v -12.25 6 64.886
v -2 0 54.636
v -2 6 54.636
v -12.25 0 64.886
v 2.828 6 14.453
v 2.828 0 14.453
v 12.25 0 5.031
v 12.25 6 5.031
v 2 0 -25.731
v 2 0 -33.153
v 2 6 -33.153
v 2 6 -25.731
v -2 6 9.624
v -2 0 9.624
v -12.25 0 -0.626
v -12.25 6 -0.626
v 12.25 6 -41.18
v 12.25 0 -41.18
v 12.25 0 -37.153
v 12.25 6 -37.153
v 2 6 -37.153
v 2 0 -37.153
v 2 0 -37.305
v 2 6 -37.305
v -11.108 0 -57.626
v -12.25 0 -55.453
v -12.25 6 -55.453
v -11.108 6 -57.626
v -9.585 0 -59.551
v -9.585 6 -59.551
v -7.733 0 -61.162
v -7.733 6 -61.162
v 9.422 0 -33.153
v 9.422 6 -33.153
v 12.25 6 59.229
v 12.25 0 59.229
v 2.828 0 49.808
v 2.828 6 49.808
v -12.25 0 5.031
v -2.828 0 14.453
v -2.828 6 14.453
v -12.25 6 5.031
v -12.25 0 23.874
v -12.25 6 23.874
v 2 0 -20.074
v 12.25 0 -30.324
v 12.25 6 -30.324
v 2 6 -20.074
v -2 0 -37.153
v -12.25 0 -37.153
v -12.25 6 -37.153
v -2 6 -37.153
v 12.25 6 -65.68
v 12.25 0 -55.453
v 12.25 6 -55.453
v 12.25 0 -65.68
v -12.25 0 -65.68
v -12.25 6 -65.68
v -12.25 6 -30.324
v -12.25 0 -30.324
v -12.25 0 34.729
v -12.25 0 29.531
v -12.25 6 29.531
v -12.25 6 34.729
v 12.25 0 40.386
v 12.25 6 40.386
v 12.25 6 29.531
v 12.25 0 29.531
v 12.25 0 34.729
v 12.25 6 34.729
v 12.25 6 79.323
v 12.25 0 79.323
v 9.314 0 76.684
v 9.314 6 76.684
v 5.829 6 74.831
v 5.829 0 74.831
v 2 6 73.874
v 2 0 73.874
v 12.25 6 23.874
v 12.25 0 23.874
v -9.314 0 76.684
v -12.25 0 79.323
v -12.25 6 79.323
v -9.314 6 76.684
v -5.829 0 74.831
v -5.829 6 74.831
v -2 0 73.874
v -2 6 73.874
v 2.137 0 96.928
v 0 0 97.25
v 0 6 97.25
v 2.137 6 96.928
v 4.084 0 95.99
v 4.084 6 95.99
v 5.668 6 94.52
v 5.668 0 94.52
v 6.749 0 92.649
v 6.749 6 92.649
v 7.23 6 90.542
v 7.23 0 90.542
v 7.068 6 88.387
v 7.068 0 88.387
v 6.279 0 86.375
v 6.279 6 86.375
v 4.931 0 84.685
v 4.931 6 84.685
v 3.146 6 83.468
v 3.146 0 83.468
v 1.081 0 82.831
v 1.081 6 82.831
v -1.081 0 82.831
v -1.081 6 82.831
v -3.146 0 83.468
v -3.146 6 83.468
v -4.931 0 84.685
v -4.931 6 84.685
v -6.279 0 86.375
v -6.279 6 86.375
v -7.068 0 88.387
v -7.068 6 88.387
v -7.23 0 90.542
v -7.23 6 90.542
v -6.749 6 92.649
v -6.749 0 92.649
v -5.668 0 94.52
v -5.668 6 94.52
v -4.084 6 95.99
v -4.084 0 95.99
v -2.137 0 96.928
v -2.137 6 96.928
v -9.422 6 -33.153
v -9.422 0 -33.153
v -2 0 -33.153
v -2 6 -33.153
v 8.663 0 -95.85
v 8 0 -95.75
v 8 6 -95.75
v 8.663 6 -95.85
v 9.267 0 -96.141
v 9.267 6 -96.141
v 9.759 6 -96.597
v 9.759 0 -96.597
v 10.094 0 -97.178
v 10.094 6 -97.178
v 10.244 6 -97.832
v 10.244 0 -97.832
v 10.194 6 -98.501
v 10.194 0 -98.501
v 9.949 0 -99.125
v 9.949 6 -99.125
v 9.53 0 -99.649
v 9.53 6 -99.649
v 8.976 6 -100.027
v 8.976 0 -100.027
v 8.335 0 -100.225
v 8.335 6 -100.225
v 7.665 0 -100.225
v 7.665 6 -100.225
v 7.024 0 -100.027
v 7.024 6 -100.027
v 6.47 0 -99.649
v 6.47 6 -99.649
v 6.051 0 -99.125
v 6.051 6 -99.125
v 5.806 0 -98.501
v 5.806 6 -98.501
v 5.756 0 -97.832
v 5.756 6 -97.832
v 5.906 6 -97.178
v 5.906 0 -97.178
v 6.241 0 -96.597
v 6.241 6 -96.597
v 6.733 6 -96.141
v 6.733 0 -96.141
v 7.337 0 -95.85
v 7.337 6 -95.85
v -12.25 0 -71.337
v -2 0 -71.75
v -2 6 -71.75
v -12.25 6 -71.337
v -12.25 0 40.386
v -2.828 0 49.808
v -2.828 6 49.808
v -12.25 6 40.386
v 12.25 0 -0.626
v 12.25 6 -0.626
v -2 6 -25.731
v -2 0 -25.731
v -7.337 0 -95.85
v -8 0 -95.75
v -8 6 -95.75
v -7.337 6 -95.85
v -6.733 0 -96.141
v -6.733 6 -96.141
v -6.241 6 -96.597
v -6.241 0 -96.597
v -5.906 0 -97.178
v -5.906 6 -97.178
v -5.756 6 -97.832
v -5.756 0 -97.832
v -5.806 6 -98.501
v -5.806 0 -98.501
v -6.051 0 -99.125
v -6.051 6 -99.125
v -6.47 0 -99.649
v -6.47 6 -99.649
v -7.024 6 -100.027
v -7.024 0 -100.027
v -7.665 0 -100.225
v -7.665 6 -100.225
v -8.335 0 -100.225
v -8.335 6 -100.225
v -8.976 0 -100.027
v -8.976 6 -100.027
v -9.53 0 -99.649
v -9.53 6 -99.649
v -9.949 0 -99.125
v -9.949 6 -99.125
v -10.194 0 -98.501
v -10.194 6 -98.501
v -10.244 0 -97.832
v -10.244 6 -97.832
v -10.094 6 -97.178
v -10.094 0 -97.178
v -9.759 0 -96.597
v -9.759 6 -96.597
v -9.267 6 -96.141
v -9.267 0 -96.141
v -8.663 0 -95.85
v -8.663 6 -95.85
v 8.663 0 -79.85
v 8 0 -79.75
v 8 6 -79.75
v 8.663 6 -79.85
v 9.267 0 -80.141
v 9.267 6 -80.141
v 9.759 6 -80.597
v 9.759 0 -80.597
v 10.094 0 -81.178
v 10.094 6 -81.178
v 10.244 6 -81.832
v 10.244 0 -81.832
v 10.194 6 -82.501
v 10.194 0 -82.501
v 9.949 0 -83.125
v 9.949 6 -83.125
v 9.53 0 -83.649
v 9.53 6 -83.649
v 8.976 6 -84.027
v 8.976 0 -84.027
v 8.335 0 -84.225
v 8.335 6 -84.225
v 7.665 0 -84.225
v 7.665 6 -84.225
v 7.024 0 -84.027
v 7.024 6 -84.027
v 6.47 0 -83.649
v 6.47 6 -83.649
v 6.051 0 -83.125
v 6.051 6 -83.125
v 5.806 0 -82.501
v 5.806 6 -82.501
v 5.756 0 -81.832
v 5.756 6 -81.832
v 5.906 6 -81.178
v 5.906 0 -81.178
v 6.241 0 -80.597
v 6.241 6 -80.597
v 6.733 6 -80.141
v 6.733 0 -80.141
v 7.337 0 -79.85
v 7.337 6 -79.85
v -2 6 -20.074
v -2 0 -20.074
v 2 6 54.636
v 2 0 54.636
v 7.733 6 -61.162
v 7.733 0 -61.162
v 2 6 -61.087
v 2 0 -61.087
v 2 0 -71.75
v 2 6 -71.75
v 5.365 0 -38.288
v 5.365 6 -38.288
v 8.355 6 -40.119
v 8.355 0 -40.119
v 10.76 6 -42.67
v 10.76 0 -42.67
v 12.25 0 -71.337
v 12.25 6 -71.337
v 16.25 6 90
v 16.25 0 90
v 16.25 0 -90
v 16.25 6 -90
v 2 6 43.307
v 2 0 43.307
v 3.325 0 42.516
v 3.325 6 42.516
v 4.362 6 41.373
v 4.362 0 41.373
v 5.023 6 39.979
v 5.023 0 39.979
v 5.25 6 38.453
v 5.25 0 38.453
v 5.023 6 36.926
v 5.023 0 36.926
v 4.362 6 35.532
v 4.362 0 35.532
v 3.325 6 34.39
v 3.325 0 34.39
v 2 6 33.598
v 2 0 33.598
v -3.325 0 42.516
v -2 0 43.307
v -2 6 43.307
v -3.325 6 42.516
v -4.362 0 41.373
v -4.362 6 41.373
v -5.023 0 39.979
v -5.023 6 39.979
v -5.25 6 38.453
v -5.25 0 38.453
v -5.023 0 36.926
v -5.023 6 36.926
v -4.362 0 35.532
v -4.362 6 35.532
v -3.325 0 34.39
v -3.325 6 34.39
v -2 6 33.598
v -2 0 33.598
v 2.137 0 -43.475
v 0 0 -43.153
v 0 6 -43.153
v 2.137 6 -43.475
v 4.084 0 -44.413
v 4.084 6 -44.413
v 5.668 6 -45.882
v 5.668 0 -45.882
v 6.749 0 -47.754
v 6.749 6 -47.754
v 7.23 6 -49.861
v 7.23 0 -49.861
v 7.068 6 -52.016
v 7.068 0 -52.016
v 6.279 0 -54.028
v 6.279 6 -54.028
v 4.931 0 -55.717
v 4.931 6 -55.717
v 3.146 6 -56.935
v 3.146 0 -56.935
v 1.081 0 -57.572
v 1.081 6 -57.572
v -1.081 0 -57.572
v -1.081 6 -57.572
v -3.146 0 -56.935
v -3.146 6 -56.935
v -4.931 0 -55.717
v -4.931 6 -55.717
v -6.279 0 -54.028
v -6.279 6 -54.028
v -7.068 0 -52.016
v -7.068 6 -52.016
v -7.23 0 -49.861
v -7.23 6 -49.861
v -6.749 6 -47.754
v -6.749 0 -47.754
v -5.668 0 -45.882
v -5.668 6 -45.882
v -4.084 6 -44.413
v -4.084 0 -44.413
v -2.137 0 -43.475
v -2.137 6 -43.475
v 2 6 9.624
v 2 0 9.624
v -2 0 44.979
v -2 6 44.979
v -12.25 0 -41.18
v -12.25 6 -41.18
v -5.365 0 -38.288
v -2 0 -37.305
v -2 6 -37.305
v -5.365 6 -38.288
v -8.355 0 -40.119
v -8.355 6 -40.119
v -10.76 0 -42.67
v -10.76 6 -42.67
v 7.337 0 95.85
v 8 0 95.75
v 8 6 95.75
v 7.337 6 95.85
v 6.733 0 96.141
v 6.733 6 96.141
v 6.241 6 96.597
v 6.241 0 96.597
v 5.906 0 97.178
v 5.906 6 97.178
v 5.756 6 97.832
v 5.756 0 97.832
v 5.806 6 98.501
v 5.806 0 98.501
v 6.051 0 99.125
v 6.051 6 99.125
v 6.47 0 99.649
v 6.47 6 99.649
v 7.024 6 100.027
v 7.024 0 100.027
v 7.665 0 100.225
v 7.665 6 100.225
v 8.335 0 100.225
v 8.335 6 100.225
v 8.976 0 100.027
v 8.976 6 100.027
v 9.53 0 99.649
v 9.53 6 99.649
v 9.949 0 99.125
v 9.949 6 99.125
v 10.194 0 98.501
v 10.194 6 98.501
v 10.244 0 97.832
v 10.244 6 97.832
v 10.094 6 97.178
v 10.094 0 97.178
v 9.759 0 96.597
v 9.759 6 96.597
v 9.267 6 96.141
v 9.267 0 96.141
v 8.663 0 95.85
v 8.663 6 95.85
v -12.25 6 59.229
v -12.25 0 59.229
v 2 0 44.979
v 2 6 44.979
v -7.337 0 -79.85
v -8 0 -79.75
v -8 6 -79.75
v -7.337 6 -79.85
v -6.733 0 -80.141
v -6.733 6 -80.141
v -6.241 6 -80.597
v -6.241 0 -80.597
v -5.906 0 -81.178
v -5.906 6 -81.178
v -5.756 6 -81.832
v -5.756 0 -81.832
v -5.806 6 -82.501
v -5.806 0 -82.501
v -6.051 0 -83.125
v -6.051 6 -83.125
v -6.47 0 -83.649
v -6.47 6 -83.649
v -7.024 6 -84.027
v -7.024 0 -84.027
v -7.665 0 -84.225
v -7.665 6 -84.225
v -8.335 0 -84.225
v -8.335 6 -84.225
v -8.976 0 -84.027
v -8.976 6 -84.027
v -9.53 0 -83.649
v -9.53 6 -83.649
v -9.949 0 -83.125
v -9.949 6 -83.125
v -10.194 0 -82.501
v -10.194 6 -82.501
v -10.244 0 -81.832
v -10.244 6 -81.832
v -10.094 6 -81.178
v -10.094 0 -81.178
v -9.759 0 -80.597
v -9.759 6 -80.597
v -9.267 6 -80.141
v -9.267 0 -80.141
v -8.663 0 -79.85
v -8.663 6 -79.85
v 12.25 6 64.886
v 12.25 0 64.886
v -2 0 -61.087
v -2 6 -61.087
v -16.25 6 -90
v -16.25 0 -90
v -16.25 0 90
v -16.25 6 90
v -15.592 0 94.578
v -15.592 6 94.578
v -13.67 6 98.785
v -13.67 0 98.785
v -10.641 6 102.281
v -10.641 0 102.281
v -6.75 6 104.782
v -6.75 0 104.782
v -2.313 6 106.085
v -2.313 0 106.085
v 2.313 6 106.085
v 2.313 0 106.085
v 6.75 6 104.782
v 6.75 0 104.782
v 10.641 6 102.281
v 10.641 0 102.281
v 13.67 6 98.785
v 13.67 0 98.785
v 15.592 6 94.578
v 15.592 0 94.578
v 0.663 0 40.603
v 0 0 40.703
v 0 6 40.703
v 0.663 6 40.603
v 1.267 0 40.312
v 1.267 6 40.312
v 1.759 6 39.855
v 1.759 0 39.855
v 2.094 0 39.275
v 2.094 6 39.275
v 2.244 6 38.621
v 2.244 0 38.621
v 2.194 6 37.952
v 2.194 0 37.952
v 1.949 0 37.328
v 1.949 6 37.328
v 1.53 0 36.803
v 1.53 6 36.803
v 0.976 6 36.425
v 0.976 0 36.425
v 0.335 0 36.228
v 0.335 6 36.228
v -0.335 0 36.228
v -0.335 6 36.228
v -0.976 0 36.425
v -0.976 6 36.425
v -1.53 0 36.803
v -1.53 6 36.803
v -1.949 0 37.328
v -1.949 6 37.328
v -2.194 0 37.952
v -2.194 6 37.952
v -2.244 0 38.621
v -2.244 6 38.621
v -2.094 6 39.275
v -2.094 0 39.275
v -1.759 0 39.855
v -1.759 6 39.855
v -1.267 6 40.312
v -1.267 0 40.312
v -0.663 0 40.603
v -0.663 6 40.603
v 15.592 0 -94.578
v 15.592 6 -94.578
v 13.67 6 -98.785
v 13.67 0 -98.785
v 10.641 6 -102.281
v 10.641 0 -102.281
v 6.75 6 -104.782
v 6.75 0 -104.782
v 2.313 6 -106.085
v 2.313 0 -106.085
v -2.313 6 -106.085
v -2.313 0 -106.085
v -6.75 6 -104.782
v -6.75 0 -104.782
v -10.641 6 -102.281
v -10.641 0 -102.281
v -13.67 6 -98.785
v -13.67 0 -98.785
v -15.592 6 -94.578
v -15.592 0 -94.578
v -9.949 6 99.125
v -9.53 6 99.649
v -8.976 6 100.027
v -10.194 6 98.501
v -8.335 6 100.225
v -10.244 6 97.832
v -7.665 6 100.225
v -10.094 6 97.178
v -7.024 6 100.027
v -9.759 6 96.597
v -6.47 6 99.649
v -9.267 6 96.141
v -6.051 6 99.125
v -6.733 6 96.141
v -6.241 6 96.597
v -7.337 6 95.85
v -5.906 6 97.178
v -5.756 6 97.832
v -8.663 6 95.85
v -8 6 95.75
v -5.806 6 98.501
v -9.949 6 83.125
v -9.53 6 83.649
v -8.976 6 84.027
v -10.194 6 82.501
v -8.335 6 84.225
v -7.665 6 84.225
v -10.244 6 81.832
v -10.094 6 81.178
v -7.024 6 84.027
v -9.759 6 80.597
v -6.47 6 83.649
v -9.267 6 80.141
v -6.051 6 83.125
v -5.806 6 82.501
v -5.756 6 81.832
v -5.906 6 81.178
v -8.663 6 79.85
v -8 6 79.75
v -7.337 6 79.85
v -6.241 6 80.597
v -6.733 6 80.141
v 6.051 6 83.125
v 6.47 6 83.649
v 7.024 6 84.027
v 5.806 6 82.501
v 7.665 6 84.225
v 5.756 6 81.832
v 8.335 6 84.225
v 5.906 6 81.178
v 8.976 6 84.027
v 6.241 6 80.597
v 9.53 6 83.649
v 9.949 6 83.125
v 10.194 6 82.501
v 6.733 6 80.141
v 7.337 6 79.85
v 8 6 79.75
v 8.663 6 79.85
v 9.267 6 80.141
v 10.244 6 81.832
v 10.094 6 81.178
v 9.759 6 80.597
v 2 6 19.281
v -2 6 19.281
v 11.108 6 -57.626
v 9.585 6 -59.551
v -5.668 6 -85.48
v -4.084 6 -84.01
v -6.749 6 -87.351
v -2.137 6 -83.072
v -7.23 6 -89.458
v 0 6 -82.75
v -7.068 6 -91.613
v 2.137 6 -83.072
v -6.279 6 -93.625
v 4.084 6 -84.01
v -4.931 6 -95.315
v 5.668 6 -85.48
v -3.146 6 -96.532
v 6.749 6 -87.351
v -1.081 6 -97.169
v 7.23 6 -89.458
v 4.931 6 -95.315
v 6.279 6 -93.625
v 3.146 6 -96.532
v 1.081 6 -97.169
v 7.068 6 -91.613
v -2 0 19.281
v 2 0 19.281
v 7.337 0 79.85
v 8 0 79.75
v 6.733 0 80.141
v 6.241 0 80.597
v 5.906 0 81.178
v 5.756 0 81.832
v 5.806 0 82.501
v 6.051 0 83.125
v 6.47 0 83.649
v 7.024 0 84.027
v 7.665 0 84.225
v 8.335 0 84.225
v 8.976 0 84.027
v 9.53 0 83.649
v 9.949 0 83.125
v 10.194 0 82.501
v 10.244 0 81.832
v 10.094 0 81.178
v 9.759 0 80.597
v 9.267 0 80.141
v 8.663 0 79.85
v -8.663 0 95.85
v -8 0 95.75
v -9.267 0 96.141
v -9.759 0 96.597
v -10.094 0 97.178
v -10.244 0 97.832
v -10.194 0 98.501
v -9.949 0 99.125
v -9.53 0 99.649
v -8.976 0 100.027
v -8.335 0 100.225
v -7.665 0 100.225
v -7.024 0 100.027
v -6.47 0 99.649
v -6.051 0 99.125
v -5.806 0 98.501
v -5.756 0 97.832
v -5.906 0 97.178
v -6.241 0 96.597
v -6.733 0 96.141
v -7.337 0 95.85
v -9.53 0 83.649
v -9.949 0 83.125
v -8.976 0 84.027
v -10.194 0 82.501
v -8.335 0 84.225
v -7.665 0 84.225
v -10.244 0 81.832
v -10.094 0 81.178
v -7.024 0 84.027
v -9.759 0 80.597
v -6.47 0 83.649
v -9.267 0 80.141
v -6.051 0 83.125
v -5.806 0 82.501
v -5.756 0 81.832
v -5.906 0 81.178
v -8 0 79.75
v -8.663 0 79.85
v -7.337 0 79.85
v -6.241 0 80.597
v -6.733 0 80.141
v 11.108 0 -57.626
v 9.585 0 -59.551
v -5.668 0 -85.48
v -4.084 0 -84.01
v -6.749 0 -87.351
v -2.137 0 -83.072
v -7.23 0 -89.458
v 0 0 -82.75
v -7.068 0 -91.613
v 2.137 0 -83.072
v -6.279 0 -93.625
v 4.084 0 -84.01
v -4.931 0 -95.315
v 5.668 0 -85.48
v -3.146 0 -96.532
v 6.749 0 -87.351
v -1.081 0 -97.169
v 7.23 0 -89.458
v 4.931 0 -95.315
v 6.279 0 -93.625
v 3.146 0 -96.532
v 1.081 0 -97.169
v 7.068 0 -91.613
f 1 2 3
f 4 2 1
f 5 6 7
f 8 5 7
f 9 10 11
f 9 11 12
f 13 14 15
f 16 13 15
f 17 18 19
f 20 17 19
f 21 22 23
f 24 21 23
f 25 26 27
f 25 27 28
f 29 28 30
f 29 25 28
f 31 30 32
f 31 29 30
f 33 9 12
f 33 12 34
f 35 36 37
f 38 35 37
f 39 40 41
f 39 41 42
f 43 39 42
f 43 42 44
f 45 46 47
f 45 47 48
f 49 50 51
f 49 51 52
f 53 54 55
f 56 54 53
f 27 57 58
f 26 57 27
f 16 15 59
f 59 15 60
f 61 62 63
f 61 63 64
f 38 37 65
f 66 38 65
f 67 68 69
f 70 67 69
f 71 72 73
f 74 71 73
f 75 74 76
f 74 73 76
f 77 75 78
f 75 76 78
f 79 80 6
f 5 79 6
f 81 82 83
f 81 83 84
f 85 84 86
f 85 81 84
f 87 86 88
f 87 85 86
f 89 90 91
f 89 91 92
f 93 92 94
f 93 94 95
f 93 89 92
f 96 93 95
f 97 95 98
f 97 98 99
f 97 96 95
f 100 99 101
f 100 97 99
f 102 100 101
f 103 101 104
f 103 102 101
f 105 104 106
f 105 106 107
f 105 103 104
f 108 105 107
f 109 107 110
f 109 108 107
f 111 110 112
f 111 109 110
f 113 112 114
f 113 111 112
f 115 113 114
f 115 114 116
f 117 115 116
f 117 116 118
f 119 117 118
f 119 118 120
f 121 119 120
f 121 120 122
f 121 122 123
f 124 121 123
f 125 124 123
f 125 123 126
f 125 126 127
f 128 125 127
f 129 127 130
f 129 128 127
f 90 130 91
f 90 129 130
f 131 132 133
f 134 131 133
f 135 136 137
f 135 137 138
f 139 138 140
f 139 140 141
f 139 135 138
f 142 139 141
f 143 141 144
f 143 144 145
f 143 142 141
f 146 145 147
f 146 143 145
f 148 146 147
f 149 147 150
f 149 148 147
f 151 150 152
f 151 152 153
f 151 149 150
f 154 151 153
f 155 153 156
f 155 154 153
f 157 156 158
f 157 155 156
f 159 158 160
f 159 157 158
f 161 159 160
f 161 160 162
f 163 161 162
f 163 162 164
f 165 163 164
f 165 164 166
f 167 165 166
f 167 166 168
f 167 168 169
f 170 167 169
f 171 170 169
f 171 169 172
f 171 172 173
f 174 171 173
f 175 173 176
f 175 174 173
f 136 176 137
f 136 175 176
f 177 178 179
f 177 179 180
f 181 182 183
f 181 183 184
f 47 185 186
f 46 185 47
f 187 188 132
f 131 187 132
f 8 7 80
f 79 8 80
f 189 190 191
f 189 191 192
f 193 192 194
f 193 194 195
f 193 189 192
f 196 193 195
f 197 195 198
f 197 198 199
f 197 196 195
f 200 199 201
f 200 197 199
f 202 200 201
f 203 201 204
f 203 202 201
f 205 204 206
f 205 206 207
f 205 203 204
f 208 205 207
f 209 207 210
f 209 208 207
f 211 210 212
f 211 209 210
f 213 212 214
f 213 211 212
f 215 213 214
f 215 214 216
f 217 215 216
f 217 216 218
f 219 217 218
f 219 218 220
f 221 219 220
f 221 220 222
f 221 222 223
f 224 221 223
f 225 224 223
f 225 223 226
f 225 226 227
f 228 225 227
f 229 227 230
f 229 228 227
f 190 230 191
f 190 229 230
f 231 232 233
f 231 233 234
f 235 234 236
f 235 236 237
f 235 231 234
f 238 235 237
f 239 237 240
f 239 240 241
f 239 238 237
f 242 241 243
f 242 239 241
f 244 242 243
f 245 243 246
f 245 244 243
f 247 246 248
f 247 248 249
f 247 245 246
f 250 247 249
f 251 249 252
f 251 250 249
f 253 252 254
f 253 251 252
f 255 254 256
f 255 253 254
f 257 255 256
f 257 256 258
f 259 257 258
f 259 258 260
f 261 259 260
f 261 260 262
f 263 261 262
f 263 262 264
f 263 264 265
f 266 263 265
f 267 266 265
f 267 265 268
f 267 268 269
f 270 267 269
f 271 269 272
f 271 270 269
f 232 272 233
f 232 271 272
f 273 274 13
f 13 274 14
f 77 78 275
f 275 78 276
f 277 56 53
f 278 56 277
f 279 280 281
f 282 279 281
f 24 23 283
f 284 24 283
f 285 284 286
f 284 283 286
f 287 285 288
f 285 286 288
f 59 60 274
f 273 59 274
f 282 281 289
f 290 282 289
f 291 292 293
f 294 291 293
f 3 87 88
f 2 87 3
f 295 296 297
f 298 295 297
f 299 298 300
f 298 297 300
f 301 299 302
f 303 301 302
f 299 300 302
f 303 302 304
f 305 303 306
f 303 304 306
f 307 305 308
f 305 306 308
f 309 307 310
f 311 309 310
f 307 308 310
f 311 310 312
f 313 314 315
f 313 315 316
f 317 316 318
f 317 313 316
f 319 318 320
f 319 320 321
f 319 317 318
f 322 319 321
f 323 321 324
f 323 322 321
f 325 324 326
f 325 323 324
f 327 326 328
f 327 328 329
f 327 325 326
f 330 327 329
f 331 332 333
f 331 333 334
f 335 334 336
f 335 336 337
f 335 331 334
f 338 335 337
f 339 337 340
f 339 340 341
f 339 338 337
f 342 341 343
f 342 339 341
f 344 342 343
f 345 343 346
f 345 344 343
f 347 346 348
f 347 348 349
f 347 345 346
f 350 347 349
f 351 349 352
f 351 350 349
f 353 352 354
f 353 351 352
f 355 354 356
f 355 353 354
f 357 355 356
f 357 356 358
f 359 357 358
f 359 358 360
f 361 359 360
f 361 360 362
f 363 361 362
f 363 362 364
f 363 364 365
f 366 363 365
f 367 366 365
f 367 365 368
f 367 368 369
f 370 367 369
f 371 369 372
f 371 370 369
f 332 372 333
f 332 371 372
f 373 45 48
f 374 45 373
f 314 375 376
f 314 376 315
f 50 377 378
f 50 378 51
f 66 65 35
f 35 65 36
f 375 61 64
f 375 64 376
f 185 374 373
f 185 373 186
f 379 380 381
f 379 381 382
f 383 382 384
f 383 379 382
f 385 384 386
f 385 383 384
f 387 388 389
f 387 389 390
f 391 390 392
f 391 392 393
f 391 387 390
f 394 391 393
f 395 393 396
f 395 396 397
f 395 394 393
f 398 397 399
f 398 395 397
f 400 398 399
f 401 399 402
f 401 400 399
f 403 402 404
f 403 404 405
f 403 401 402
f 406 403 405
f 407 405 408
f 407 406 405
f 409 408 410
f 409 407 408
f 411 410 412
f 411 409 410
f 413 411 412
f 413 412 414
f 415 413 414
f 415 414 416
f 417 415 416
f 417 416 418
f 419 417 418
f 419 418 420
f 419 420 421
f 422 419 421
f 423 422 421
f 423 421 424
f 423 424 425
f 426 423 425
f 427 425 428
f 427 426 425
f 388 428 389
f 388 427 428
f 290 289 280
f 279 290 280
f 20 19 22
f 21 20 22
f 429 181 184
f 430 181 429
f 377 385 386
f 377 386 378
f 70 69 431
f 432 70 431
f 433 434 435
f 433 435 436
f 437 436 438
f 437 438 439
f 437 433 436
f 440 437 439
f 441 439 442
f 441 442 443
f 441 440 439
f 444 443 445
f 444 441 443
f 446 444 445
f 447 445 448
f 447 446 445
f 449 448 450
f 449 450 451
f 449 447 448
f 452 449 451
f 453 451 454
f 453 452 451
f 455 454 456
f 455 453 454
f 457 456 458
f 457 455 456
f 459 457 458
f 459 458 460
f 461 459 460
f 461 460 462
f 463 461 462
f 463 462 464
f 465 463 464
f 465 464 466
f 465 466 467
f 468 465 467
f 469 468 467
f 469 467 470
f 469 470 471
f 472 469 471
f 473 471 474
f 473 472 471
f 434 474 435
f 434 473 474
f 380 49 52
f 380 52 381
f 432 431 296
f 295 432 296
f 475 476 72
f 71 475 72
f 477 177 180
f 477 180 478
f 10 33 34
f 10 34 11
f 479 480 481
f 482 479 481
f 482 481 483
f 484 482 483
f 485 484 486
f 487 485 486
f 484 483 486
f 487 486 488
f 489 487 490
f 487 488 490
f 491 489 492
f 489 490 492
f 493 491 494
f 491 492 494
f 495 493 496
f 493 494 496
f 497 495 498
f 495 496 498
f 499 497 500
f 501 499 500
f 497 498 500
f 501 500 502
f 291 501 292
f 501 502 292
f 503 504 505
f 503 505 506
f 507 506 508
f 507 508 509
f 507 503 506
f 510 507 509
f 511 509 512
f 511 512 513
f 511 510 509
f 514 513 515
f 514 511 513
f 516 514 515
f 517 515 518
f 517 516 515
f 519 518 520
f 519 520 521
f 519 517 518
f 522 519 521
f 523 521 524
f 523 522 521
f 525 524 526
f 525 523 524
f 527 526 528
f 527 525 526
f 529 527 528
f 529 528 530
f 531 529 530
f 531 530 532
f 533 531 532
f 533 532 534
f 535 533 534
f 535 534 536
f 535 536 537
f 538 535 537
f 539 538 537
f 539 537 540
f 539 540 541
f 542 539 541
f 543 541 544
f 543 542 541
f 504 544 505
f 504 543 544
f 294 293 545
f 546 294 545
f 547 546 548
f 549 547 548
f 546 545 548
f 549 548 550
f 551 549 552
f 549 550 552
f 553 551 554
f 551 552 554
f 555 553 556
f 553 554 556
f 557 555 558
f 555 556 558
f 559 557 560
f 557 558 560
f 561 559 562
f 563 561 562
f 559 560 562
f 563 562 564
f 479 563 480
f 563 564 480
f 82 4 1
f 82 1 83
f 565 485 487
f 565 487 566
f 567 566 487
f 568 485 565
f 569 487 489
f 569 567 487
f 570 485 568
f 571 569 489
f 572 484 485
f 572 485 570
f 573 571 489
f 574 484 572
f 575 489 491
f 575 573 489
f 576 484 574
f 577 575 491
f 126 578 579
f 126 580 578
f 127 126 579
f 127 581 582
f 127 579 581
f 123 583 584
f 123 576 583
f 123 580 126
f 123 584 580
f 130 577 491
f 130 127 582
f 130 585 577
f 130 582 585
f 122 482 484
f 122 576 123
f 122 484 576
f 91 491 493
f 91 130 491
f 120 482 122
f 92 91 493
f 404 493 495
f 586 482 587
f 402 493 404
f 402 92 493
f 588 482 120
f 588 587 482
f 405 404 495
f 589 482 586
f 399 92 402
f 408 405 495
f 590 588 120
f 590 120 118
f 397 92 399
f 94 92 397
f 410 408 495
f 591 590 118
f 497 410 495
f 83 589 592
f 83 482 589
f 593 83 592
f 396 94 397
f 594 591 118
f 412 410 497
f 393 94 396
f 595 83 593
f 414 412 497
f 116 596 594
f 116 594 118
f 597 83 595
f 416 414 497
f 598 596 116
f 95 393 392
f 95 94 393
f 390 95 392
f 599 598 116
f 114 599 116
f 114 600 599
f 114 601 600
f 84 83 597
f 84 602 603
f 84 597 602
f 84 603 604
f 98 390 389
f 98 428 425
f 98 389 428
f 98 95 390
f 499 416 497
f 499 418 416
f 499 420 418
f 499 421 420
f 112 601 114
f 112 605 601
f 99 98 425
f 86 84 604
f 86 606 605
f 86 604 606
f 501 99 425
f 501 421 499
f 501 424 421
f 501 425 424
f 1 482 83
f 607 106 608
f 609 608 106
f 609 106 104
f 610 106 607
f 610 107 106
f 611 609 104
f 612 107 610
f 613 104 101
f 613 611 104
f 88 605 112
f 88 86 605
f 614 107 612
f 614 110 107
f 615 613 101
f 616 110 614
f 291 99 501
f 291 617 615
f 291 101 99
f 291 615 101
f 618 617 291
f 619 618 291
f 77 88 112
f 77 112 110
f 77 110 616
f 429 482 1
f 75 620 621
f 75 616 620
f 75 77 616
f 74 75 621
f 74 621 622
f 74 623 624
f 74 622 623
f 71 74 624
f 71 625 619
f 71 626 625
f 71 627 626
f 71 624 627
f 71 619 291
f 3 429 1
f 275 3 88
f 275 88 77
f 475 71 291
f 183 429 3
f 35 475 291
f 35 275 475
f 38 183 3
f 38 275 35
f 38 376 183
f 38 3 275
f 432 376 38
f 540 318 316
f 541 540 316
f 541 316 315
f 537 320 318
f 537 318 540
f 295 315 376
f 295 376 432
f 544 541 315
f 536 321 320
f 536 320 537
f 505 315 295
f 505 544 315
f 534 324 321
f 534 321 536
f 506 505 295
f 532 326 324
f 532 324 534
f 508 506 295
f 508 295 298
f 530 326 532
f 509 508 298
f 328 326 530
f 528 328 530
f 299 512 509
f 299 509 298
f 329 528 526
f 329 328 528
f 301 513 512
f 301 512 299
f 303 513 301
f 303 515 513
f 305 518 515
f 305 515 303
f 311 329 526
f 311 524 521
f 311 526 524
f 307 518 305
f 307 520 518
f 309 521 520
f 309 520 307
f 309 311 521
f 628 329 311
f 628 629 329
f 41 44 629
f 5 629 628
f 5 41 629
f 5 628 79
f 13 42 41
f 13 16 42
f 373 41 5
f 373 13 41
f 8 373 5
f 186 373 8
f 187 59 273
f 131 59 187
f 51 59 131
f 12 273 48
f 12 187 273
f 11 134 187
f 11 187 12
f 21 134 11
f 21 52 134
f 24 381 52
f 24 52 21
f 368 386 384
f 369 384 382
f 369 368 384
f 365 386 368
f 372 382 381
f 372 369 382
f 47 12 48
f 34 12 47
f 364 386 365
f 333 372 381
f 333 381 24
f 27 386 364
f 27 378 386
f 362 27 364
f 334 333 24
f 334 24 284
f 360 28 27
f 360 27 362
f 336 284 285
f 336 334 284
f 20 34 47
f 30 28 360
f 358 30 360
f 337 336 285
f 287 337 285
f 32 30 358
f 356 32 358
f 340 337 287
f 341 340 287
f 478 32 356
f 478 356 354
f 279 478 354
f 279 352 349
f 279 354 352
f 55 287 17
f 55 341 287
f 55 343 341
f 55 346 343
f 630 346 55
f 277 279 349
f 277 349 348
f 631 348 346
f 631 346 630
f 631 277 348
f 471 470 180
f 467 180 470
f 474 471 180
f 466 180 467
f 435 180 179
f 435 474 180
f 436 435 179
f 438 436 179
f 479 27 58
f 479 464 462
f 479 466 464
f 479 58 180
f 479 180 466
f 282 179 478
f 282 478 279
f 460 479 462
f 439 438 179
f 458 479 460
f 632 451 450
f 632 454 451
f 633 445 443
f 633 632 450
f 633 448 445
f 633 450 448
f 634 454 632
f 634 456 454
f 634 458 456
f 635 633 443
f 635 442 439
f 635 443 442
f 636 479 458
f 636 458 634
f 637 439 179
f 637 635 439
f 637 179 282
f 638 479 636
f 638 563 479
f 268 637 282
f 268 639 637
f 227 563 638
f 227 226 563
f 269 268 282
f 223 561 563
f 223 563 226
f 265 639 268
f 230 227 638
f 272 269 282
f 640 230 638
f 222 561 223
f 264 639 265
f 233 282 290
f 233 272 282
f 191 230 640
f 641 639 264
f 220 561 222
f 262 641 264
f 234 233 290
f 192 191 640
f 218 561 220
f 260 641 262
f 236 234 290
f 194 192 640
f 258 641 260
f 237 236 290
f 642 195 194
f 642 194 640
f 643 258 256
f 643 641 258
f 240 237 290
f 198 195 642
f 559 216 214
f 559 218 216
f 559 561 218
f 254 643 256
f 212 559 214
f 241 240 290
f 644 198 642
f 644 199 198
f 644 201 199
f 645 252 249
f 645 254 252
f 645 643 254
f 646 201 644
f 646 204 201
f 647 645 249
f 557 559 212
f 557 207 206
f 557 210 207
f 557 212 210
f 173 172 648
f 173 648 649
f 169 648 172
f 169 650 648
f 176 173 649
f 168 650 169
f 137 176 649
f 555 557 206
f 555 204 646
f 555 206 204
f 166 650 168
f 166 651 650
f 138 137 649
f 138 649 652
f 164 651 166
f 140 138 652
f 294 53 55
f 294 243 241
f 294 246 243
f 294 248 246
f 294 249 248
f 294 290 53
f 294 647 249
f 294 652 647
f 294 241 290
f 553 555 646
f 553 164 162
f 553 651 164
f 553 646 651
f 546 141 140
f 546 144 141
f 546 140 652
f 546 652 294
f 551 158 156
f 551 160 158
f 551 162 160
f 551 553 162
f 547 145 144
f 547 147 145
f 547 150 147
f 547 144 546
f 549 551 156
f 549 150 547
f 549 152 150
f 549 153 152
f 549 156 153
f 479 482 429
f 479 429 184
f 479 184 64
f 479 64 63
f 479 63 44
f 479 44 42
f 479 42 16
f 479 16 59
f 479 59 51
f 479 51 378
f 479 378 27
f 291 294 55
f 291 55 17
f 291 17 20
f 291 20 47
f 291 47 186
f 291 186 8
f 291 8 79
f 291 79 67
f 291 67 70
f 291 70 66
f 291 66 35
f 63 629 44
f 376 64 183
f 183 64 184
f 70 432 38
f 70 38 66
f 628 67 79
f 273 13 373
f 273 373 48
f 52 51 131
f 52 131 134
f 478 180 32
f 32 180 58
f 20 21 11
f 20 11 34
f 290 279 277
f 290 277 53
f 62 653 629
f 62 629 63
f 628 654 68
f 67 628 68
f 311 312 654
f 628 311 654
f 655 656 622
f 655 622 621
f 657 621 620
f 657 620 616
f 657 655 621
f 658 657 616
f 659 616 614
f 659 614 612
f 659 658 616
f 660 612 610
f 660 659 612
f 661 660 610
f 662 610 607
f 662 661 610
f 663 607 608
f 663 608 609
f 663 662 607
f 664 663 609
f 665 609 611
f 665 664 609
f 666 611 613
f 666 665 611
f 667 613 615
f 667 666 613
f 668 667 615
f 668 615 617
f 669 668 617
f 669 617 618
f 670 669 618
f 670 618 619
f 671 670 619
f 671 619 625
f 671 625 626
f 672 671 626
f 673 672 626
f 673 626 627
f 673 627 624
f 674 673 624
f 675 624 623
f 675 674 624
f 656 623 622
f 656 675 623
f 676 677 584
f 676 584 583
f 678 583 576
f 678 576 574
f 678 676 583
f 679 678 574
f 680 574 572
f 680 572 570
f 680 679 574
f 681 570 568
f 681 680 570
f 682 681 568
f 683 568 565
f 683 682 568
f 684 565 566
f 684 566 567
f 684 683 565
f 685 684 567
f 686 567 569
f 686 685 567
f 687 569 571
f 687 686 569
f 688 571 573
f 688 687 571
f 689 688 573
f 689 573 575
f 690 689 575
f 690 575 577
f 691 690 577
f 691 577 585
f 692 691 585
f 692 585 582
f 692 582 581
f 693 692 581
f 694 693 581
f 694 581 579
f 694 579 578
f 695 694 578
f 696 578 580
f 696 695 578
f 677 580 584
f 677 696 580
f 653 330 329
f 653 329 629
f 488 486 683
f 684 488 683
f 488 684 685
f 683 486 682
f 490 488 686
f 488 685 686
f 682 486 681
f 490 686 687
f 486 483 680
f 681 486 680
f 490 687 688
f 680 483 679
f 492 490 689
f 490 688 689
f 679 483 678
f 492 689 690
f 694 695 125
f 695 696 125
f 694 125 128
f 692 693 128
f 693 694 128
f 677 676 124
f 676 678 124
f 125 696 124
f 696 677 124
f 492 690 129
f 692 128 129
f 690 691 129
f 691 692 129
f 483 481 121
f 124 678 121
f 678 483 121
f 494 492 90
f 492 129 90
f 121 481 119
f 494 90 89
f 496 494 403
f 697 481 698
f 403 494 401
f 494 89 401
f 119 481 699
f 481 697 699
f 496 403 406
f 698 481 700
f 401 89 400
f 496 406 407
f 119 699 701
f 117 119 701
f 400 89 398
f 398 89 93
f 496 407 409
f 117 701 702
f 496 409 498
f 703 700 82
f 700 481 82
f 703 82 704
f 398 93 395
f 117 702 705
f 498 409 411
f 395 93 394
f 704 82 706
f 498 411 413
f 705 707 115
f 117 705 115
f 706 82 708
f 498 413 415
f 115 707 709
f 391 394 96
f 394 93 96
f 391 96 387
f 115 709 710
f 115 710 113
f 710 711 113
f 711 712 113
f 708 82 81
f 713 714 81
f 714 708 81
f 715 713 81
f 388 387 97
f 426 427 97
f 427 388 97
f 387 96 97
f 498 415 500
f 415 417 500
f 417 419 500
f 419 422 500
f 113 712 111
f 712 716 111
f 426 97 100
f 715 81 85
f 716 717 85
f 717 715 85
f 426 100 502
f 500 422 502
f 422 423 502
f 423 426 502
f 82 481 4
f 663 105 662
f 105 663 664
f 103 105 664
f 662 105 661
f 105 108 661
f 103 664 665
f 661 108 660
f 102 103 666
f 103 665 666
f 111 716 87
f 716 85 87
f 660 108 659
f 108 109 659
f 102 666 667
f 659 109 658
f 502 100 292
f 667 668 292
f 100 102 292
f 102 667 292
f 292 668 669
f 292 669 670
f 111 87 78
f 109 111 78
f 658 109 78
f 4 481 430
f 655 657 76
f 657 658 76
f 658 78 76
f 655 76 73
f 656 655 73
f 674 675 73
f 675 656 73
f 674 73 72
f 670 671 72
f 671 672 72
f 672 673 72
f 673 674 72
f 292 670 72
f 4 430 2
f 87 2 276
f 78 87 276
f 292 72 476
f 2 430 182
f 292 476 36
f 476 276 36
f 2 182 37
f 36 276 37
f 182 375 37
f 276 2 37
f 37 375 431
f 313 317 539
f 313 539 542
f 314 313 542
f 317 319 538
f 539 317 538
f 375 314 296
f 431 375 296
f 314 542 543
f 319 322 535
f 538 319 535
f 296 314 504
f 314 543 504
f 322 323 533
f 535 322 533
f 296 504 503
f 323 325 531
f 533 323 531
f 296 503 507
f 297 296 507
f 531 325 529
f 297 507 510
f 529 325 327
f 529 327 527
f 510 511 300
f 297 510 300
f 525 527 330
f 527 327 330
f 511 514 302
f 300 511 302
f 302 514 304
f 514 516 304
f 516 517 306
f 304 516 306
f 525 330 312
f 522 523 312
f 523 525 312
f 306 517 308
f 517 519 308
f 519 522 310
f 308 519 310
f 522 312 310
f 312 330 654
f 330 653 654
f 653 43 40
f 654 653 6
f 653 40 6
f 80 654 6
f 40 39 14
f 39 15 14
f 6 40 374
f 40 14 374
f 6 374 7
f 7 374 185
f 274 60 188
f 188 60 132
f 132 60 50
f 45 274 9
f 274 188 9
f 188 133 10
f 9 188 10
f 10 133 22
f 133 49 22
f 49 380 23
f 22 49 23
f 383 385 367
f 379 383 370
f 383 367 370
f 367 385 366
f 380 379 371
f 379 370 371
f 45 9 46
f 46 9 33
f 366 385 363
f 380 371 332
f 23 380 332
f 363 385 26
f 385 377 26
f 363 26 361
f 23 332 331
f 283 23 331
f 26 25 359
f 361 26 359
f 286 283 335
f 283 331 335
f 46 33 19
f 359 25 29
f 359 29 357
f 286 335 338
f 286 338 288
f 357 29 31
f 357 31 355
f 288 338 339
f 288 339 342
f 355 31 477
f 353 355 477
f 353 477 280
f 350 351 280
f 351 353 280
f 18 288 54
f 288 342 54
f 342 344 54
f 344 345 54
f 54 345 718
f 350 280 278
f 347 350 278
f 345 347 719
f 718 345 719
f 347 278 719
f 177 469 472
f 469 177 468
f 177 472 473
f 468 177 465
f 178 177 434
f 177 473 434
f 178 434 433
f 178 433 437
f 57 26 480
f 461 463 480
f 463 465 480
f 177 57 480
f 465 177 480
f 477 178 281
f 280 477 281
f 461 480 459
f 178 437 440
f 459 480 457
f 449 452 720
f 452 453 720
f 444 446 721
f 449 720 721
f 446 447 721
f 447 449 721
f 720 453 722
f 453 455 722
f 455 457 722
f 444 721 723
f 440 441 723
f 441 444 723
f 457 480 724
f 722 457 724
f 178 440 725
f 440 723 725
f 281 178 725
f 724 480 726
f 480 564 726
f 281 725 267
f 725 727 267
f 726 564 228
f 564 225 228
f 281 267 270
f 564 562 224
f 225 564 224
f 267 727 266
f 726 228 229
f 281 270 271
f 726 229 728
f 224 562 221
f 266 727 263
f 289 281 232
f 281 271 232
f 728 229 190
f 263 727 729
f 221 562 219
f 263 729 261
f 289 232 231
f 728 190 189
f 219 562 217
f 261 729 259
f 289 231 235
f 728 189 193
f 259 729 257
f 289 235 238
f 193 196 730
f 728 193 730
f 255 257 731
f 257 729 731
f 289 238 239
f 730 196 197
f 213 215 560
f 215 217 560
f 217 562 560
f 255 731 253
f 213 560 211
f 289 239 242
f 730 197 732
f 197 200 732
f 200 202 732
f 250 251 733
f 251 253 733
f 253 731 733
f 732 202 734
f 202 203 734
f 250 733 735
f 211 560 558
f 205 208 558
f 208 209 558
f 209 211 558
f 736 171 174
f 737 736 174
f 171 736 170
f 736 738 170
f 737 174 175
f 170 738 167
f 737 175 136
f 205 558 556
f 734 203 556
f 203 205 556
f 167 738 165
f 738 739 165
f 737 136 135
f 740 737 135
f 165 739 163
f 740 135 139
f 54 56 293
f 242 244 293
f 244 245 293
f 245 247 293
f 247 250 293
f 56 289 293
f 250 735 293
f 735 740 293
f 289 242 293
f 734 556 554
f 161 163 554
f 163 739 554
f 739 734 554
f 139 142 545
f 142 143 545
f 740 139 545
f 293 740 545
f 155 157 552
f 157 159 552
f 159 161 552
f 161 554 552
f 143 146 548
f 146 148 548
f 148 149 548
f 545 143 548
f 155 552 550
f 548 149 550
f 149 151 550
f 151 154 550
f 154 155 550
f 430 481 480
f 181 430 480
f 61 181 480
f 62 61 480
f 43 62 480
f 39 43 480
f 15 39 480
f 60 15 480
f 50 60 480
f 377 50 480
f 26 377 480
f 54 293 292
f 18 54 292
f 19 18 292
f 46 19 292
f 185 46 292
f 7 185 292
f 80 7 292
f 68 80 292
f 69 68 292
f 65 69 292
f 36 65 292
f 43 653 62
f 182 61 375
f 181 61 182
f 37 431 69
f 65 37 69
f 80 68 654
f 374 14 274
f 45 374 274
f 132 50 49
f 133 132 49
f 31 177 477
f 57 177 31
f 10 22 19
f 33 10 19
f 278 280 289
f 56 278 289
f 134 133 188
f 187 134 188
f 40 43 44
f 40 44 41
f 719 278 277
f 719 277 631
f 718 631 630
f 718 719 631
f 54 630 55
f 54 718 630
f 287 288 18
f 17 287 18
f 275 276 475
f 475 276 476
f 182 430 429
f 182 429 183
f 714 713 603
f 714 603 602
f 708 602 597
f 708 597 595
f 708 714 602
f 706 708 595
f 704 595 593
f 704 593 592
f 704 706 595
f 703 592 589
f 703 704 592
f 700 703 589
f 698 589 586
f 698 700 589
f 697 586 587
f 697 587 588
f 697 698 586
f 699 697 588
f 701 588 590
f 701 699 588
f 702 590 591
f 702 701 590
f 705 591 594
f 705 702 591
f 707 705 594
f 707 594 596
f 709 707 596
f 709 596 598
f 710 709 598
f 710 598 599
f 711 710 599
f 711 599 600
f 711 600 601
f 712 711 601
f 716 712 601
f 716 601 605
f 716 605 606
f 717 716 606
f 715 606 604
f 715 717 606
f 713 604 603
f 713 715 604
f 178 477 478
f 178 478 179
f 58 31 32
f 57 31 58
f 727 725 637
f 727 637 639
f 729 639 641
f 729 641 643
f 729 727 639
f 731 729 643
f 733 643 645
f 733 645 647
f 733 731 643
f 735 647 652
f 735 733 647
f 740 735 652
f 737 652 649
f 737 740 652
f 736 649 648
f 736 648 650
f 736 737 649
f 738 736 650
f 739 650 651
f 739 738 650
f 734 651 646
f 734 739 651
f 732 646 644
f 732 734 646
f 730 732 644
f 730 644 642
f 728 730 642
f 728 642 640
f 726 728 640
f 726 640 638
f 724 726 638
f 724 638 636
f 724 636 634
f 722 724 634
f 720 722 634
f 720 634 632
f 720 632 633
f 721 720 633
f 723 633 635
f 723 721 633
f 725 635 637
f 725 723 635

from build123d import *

# Parameters (mm, degrees)
SKETCH2_R           = 7.25
SKETCH2_R_2         = 2.25
BOSS_EXTRUDE1_DEPTH = 6
CUT_EXTRUDE1_START  = -6
CUT_EXTRUDE1_DEPTH  = 6


with BuildPart() as part:
    # Sketch2 → Boss-Extrude1 (new body)
    with BuildSketch(Plane(origin=(0, 0, 0), x_dir=(1, 0, 0), z_dir=(0, 1, 0))):
        with BuildLine():
            Line((-16.25, 90), (-16.25, -90))
            ThreePointArc((-16.25, -90), (0, -106.25), (16.25, -90))
            Line((16.25, -90), (16.25, 90))
            ThreePointArc((16.25, 90), (0, 106.25), (-16.25, 90))
        make_face()
        with Locations(Location((0, 90, 0), (0, 0, 270))):
            Circle(SKETCH2_R, mode=Mode.SUBTRACT)
        with Locations(Location((0, -90, 0), (0, 0, 270))):
            Circle(SKETCH2_R, mode=Mode.SUBTRACT)
        with Locations(Location((8, 98, 0), (0, 0, 270))):
            Circle(SKETCH2_R_2, mode=Mode.SUBTRACT)
        with Locations(Location((-8, 98, 0), (0, 0, 270))):
            Circle(SKETCH2_R_2, mode=Mode.SUBTRACT)
        with Locations(Location((-8, 82, 0), (0, 0, 270))):
            Circle(SKETCH2_R_2, mode=Mode.SUBTRACT)
        with Locations(Location((8, 82, 0), (0, 0, 270))):
            Circle(SKETCH2_R_2, mode=Mode.SUBTRACT)
        with Locations(Location((8, -98, 0), (0, 0, 90))):
            Circle(SKETCH2_R_2, mode=Mode.SUBTRACT)
        with Locations(Location((8, -82, 0), (0, 0, 90))):
            Circle(SKETCH2_R_2, mode=Mode.SUBTRACT)
        with Locations(Location((-8, -82, 0), (0, 0, 90))):
            Circle(SKETCH2_R_2, mode=Mode.SUBTRACT)
        with Locations(Location((-8, -98, 0), (0, 0, 90))):
            Circle(SKETCH2_R_2, mode=Mode.SUBTRACT)
        with Locations(Location((0, 50.402785483, 0), (0, 0, 270))):
            Circle(SKETCH2_R, mode=Mode.SUBTRACT)
        with Locations(Location((0, -38.452553576, 0), (0, 0, 270))):
            Circle(SKETCH2_R_2, mode=Mode.SUBTRACT)
    extrude(amount=BOSS_EXTRUDE1_DEPTH)

    # Sketch3 → Cut-Extrude1 (cut)
    with BuildSketch(Plane(origin=(0, 6, 0), x_dir=(1, 0, 0), z_dir=(0, 1, 0)).offset(CUT_EXTRUDE1_START)):
        Polygon((-12.25, 30.324358358), (-2, 20.074358358), (-2, -9.624126451), (-12.25, 0.625873549), align=None)
        Polygon((-12.25, -5.030980701), (-12.25, -23.874126451), (-2.828427125, -14.452553576), align=None)
        Polygon((-9.421572875, 33.152785483), (-2, 33.152785483), (-2, 25.731212608), align=None)
        Polygon((12.25, -23.874126451), (2.828427125, -14.452553576), (12.25, -5.030980701), align=None)
        Polygon((9.421572875, 33.152785483), (2, 33.152785483), (2, 25.731212608), align=None)
        Polygon((2, -9.624126451), (12.25, 0.625873549), (12.25, 30.324358358), (2, 20.074358358), align=None)
        Polygon((-12.25, 71.336551667), (-2, 61.086551667), (-2, 71.75), align=None)
        with BuildLine():
            Line((-12.25, 65.679697418), (-12.25, 55.452537952))
            ThreePointArc((-12.25, 55.452537952), (-10.391208444, 58.623812614), (-7.732662193, 61.162359611))
            Line((-7.732662193, 61.162359611), (-12.25, 65.679697418))
        make_face()
        with BuildLine():
            Line((-12.25, 41.179697418), (-12.25, 37.152785483))
            Line((-12.25, 37.152785483), (-2, 37.152785483))
            Line((-2, 37.152785483), (-2, 37.304598586))
            ThreePointArc((-2, 37.304598586), (-6.92090289, 39.103953544), (-10.759574128, 42.67012329))
            Line((-10.759574128, 42.67012329), (-12.25, 41.179697418))
        make_face()
        with BuildLine():
            Line((12.25, 41.179697418), (12.25, 37.152785483))
            Line((12.25, 37.152785483), (2, 37.152785483))
            Line((2, 37.152785483), (2, 37.304598586))
            ThreePointArc((2, 37.304598586), (6.92090289, 39.103953544), (10.759574128, 42.67012329))
            Line((10.759574128, 42.67012329), (12.25, 41.179697418))
        make_face()
        with BuildLine():
            Line((12.25, 65.679697418), (7.732662193, 61.162359611))
            ThreePointArc((7.732662193, 61.162359611), (10.391208444, 58.623812614), (12.25, 55.452537952))
            Line((12.25, 55.452537952), (12.25, 65.679697418))
        make_face()
        Polygon((2, 61.086551667), (2, 71.75), (12.25, 71.336551667), align=None)
        with BuildLine():
            Line((-2, -19.280980701), (-12.25, -29.530980701))
            Line((-12.25, -29.530980701), (-12.25, -34.729465511))
            Line((-12.25, -34.729465511), (-2, -44.979465511))
            Line((-2, -44.979465511), (-2, -43.306675536))
            ThreePointArc((-2, -43.306675536), (-5.25, -38.452553576), (-2, -33.598431616))
            Line((-2, -33.598431616), (-2, -19.280980701))
        make_face()
        Polygon((-12.25, -40.38631976), (-12.25, -59.229465511), (-2.828427125, -49.807892635), align=None)
        with BuildLine():
            Line((-2, -54.63631976), (-12.25, -64.88631976))
            Line((-12.25, -64.88631976), (-12.25, -79.322921748))
            ThreePointArc((-12.25, -79.322921748), (-7.628207354, -75.651726495), (-2, -73.873546577))
            Line((-2, -73.873546577), (-2, -54.63631976))
        make_face()
        with BuildLine():
            Line((12.25, -64.88631976), (12.25, -79.322921748))
            ThreePointArc((12.25, -79.322921748), (7.628207354, -75.651726495), (2, -73.873546577))
            Line((2, -73.873546577), (2, -54.63631976))
            Line((2, -54.63631976), (12.25, -64.88631976))
        make_face()
        Polygon((12.25, -59.229465511), (2.828427125, -49.807892635), (12.25, -40.38631976), align=None)
        with BuildLine():
            Line((12.25, -34.729465511), (2, -44.979465511))
            Line((2, -44.979465511), (2, -43.306675536))
            ThreePointArc((2, -43.306675536), (5.25, -38.452553576), (2, -33.598431616))
            Line((2, -33.598431616), (2, -19.280980701))
            Line((2, -19.280980701), (12.25, -29.530980701))
            Line((12.25, -29.530980701), (12.25, -34.729465511))
        make_face()
    extrude(amount=CUT_EXTRUDE1_DEPTH, mode=Mode.SUBTRACT)


solid = part.part
